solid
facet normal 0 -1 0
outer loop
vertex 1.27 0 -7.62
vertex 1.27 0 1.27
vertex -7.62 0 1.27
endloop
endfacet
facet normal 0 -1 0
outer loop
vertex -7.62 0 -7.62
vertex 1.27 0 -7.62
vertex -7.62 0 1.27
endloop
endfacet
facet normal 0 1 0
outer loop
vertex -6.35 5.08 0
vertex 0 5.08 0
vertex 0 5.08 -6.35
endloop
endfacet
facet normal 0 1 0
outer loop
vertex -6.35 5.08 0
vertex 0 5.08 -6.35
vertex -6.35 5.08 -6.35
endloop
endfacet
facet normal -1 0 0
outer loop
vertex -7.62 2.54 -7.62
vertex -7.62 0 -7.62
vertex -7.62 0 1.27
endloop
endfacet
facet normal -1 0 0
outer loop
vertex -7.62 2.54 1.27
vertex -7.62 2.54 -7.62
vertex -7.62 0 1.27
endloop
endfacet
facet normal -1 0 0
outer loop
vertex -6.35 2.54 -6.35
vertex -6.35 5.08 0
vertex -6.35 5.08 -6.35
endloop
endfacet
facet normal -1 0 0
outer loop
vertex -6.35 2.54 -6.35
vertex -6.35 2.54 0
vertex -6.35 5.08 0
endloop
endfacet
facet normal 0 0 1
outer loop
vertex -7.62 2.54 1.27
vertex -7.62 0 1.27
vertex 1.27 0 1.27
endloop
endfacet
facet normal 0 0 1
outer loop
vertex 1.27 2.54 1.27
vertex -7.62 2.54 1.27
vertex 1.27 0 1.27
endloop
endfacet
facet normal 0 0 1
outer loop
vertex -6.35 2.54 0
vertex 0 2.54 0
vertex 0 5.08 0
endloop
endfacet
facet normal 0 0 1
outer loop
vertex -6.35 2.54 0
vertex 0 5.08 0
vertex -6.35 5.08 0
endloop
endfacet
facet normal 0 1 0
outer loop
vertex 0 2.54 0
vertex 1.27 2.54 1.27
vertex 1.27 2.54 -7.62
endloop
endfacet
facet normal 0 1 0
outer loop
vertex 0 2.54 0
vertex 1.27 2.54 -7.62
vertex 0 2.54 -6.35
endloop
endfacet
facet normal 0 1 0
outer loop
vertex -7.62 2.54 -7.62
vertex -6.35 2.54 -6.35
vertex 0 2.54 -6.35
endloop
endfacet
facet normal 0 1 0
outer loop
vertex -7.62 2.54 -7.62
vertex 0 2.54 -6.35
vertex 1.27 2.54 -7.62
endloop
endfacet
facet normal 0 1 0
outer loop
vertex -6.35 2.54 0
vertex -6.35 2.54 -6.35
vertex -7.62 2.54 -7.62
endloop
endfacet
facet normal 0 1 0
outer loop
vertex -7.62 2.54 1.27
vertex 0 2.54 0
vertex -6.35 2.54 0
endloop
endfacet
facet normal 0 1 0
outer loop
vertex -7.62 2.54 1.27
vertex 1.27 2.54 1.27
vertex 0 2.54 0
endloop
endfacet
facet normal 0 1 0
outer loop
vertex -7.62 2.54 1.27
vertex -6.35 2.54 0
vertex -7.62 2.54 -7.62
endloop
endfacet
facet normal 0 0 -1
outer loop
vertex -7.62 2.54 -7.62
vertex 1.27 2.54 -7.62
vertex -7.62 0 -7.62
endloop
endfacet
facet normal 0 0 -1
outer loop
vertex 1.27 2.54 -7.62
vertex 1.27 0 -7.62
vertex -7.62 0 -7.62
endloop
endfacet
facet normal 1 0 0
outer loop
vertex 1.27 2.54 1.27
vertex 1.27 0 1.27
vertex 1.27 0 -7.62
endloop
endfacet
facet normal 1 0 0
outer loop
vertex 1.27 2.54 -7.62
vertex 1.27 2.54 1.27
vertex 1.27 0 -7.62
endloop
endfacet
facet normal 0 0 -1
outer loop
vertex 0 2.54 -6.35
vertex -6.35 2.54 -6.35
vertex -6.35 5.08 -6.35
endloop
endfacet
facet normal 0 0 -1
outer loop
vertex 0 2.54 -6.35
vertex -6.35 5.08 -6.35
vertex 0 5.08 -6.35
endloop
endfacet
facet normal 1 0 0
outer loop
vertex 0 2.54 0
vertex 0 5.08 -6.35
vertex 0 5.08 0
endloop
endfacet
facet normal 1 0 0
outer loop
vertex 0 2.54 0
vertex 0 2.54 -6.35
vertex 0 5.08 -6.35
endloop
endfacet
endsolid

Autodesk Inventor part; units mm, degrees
ref_plane "YZ Plane" through (0, 0, 0) normal (1, 0, 0) x (0, 1, 0)
ref_plane "XZ Plane" through (0, 0, 0) normal (0, 1, 0) x (-1, 0, 0)
ref_plane "XY Plane" through (0, 0, 0) normal (0, 0, 1) x (1, 0, 0)
sketch "Sketch1" plane through (0, 0, 0) normal (0, 1, 0) x (-1, 0, 0)
  line L0 (0, 0) -> (6.35, 0)
  line L1 (6.35, 0) -> (6.35, -6.35)
  line L2 (6.35, -6.35) -> (0, -6.35)
  line L3 (0, -6.35) -> (0, 0)
  line L4 (7.62, -7.62) -> (7.62, 1.27)
  line L5 (7.62, 1.27) -> (-1.27, 1.27)
  line L6 (-1.27, 1.27) -> (-1.27, -7.62)
  line L7 (-1.27, -7.62) -> (7.62, -7.62)
  dimension "d0" = 6.35
  dimension "d1" = 6.35
  dimension "d2" = 1.27
extrude "Extrusion1" add sketch "Sketch1" along normal blind 5.08 contours L0 L1 L2 L3
extrude "Extrusion2" add sketch "Sketch1" along normal blind 2.54
properties part number "LED"
